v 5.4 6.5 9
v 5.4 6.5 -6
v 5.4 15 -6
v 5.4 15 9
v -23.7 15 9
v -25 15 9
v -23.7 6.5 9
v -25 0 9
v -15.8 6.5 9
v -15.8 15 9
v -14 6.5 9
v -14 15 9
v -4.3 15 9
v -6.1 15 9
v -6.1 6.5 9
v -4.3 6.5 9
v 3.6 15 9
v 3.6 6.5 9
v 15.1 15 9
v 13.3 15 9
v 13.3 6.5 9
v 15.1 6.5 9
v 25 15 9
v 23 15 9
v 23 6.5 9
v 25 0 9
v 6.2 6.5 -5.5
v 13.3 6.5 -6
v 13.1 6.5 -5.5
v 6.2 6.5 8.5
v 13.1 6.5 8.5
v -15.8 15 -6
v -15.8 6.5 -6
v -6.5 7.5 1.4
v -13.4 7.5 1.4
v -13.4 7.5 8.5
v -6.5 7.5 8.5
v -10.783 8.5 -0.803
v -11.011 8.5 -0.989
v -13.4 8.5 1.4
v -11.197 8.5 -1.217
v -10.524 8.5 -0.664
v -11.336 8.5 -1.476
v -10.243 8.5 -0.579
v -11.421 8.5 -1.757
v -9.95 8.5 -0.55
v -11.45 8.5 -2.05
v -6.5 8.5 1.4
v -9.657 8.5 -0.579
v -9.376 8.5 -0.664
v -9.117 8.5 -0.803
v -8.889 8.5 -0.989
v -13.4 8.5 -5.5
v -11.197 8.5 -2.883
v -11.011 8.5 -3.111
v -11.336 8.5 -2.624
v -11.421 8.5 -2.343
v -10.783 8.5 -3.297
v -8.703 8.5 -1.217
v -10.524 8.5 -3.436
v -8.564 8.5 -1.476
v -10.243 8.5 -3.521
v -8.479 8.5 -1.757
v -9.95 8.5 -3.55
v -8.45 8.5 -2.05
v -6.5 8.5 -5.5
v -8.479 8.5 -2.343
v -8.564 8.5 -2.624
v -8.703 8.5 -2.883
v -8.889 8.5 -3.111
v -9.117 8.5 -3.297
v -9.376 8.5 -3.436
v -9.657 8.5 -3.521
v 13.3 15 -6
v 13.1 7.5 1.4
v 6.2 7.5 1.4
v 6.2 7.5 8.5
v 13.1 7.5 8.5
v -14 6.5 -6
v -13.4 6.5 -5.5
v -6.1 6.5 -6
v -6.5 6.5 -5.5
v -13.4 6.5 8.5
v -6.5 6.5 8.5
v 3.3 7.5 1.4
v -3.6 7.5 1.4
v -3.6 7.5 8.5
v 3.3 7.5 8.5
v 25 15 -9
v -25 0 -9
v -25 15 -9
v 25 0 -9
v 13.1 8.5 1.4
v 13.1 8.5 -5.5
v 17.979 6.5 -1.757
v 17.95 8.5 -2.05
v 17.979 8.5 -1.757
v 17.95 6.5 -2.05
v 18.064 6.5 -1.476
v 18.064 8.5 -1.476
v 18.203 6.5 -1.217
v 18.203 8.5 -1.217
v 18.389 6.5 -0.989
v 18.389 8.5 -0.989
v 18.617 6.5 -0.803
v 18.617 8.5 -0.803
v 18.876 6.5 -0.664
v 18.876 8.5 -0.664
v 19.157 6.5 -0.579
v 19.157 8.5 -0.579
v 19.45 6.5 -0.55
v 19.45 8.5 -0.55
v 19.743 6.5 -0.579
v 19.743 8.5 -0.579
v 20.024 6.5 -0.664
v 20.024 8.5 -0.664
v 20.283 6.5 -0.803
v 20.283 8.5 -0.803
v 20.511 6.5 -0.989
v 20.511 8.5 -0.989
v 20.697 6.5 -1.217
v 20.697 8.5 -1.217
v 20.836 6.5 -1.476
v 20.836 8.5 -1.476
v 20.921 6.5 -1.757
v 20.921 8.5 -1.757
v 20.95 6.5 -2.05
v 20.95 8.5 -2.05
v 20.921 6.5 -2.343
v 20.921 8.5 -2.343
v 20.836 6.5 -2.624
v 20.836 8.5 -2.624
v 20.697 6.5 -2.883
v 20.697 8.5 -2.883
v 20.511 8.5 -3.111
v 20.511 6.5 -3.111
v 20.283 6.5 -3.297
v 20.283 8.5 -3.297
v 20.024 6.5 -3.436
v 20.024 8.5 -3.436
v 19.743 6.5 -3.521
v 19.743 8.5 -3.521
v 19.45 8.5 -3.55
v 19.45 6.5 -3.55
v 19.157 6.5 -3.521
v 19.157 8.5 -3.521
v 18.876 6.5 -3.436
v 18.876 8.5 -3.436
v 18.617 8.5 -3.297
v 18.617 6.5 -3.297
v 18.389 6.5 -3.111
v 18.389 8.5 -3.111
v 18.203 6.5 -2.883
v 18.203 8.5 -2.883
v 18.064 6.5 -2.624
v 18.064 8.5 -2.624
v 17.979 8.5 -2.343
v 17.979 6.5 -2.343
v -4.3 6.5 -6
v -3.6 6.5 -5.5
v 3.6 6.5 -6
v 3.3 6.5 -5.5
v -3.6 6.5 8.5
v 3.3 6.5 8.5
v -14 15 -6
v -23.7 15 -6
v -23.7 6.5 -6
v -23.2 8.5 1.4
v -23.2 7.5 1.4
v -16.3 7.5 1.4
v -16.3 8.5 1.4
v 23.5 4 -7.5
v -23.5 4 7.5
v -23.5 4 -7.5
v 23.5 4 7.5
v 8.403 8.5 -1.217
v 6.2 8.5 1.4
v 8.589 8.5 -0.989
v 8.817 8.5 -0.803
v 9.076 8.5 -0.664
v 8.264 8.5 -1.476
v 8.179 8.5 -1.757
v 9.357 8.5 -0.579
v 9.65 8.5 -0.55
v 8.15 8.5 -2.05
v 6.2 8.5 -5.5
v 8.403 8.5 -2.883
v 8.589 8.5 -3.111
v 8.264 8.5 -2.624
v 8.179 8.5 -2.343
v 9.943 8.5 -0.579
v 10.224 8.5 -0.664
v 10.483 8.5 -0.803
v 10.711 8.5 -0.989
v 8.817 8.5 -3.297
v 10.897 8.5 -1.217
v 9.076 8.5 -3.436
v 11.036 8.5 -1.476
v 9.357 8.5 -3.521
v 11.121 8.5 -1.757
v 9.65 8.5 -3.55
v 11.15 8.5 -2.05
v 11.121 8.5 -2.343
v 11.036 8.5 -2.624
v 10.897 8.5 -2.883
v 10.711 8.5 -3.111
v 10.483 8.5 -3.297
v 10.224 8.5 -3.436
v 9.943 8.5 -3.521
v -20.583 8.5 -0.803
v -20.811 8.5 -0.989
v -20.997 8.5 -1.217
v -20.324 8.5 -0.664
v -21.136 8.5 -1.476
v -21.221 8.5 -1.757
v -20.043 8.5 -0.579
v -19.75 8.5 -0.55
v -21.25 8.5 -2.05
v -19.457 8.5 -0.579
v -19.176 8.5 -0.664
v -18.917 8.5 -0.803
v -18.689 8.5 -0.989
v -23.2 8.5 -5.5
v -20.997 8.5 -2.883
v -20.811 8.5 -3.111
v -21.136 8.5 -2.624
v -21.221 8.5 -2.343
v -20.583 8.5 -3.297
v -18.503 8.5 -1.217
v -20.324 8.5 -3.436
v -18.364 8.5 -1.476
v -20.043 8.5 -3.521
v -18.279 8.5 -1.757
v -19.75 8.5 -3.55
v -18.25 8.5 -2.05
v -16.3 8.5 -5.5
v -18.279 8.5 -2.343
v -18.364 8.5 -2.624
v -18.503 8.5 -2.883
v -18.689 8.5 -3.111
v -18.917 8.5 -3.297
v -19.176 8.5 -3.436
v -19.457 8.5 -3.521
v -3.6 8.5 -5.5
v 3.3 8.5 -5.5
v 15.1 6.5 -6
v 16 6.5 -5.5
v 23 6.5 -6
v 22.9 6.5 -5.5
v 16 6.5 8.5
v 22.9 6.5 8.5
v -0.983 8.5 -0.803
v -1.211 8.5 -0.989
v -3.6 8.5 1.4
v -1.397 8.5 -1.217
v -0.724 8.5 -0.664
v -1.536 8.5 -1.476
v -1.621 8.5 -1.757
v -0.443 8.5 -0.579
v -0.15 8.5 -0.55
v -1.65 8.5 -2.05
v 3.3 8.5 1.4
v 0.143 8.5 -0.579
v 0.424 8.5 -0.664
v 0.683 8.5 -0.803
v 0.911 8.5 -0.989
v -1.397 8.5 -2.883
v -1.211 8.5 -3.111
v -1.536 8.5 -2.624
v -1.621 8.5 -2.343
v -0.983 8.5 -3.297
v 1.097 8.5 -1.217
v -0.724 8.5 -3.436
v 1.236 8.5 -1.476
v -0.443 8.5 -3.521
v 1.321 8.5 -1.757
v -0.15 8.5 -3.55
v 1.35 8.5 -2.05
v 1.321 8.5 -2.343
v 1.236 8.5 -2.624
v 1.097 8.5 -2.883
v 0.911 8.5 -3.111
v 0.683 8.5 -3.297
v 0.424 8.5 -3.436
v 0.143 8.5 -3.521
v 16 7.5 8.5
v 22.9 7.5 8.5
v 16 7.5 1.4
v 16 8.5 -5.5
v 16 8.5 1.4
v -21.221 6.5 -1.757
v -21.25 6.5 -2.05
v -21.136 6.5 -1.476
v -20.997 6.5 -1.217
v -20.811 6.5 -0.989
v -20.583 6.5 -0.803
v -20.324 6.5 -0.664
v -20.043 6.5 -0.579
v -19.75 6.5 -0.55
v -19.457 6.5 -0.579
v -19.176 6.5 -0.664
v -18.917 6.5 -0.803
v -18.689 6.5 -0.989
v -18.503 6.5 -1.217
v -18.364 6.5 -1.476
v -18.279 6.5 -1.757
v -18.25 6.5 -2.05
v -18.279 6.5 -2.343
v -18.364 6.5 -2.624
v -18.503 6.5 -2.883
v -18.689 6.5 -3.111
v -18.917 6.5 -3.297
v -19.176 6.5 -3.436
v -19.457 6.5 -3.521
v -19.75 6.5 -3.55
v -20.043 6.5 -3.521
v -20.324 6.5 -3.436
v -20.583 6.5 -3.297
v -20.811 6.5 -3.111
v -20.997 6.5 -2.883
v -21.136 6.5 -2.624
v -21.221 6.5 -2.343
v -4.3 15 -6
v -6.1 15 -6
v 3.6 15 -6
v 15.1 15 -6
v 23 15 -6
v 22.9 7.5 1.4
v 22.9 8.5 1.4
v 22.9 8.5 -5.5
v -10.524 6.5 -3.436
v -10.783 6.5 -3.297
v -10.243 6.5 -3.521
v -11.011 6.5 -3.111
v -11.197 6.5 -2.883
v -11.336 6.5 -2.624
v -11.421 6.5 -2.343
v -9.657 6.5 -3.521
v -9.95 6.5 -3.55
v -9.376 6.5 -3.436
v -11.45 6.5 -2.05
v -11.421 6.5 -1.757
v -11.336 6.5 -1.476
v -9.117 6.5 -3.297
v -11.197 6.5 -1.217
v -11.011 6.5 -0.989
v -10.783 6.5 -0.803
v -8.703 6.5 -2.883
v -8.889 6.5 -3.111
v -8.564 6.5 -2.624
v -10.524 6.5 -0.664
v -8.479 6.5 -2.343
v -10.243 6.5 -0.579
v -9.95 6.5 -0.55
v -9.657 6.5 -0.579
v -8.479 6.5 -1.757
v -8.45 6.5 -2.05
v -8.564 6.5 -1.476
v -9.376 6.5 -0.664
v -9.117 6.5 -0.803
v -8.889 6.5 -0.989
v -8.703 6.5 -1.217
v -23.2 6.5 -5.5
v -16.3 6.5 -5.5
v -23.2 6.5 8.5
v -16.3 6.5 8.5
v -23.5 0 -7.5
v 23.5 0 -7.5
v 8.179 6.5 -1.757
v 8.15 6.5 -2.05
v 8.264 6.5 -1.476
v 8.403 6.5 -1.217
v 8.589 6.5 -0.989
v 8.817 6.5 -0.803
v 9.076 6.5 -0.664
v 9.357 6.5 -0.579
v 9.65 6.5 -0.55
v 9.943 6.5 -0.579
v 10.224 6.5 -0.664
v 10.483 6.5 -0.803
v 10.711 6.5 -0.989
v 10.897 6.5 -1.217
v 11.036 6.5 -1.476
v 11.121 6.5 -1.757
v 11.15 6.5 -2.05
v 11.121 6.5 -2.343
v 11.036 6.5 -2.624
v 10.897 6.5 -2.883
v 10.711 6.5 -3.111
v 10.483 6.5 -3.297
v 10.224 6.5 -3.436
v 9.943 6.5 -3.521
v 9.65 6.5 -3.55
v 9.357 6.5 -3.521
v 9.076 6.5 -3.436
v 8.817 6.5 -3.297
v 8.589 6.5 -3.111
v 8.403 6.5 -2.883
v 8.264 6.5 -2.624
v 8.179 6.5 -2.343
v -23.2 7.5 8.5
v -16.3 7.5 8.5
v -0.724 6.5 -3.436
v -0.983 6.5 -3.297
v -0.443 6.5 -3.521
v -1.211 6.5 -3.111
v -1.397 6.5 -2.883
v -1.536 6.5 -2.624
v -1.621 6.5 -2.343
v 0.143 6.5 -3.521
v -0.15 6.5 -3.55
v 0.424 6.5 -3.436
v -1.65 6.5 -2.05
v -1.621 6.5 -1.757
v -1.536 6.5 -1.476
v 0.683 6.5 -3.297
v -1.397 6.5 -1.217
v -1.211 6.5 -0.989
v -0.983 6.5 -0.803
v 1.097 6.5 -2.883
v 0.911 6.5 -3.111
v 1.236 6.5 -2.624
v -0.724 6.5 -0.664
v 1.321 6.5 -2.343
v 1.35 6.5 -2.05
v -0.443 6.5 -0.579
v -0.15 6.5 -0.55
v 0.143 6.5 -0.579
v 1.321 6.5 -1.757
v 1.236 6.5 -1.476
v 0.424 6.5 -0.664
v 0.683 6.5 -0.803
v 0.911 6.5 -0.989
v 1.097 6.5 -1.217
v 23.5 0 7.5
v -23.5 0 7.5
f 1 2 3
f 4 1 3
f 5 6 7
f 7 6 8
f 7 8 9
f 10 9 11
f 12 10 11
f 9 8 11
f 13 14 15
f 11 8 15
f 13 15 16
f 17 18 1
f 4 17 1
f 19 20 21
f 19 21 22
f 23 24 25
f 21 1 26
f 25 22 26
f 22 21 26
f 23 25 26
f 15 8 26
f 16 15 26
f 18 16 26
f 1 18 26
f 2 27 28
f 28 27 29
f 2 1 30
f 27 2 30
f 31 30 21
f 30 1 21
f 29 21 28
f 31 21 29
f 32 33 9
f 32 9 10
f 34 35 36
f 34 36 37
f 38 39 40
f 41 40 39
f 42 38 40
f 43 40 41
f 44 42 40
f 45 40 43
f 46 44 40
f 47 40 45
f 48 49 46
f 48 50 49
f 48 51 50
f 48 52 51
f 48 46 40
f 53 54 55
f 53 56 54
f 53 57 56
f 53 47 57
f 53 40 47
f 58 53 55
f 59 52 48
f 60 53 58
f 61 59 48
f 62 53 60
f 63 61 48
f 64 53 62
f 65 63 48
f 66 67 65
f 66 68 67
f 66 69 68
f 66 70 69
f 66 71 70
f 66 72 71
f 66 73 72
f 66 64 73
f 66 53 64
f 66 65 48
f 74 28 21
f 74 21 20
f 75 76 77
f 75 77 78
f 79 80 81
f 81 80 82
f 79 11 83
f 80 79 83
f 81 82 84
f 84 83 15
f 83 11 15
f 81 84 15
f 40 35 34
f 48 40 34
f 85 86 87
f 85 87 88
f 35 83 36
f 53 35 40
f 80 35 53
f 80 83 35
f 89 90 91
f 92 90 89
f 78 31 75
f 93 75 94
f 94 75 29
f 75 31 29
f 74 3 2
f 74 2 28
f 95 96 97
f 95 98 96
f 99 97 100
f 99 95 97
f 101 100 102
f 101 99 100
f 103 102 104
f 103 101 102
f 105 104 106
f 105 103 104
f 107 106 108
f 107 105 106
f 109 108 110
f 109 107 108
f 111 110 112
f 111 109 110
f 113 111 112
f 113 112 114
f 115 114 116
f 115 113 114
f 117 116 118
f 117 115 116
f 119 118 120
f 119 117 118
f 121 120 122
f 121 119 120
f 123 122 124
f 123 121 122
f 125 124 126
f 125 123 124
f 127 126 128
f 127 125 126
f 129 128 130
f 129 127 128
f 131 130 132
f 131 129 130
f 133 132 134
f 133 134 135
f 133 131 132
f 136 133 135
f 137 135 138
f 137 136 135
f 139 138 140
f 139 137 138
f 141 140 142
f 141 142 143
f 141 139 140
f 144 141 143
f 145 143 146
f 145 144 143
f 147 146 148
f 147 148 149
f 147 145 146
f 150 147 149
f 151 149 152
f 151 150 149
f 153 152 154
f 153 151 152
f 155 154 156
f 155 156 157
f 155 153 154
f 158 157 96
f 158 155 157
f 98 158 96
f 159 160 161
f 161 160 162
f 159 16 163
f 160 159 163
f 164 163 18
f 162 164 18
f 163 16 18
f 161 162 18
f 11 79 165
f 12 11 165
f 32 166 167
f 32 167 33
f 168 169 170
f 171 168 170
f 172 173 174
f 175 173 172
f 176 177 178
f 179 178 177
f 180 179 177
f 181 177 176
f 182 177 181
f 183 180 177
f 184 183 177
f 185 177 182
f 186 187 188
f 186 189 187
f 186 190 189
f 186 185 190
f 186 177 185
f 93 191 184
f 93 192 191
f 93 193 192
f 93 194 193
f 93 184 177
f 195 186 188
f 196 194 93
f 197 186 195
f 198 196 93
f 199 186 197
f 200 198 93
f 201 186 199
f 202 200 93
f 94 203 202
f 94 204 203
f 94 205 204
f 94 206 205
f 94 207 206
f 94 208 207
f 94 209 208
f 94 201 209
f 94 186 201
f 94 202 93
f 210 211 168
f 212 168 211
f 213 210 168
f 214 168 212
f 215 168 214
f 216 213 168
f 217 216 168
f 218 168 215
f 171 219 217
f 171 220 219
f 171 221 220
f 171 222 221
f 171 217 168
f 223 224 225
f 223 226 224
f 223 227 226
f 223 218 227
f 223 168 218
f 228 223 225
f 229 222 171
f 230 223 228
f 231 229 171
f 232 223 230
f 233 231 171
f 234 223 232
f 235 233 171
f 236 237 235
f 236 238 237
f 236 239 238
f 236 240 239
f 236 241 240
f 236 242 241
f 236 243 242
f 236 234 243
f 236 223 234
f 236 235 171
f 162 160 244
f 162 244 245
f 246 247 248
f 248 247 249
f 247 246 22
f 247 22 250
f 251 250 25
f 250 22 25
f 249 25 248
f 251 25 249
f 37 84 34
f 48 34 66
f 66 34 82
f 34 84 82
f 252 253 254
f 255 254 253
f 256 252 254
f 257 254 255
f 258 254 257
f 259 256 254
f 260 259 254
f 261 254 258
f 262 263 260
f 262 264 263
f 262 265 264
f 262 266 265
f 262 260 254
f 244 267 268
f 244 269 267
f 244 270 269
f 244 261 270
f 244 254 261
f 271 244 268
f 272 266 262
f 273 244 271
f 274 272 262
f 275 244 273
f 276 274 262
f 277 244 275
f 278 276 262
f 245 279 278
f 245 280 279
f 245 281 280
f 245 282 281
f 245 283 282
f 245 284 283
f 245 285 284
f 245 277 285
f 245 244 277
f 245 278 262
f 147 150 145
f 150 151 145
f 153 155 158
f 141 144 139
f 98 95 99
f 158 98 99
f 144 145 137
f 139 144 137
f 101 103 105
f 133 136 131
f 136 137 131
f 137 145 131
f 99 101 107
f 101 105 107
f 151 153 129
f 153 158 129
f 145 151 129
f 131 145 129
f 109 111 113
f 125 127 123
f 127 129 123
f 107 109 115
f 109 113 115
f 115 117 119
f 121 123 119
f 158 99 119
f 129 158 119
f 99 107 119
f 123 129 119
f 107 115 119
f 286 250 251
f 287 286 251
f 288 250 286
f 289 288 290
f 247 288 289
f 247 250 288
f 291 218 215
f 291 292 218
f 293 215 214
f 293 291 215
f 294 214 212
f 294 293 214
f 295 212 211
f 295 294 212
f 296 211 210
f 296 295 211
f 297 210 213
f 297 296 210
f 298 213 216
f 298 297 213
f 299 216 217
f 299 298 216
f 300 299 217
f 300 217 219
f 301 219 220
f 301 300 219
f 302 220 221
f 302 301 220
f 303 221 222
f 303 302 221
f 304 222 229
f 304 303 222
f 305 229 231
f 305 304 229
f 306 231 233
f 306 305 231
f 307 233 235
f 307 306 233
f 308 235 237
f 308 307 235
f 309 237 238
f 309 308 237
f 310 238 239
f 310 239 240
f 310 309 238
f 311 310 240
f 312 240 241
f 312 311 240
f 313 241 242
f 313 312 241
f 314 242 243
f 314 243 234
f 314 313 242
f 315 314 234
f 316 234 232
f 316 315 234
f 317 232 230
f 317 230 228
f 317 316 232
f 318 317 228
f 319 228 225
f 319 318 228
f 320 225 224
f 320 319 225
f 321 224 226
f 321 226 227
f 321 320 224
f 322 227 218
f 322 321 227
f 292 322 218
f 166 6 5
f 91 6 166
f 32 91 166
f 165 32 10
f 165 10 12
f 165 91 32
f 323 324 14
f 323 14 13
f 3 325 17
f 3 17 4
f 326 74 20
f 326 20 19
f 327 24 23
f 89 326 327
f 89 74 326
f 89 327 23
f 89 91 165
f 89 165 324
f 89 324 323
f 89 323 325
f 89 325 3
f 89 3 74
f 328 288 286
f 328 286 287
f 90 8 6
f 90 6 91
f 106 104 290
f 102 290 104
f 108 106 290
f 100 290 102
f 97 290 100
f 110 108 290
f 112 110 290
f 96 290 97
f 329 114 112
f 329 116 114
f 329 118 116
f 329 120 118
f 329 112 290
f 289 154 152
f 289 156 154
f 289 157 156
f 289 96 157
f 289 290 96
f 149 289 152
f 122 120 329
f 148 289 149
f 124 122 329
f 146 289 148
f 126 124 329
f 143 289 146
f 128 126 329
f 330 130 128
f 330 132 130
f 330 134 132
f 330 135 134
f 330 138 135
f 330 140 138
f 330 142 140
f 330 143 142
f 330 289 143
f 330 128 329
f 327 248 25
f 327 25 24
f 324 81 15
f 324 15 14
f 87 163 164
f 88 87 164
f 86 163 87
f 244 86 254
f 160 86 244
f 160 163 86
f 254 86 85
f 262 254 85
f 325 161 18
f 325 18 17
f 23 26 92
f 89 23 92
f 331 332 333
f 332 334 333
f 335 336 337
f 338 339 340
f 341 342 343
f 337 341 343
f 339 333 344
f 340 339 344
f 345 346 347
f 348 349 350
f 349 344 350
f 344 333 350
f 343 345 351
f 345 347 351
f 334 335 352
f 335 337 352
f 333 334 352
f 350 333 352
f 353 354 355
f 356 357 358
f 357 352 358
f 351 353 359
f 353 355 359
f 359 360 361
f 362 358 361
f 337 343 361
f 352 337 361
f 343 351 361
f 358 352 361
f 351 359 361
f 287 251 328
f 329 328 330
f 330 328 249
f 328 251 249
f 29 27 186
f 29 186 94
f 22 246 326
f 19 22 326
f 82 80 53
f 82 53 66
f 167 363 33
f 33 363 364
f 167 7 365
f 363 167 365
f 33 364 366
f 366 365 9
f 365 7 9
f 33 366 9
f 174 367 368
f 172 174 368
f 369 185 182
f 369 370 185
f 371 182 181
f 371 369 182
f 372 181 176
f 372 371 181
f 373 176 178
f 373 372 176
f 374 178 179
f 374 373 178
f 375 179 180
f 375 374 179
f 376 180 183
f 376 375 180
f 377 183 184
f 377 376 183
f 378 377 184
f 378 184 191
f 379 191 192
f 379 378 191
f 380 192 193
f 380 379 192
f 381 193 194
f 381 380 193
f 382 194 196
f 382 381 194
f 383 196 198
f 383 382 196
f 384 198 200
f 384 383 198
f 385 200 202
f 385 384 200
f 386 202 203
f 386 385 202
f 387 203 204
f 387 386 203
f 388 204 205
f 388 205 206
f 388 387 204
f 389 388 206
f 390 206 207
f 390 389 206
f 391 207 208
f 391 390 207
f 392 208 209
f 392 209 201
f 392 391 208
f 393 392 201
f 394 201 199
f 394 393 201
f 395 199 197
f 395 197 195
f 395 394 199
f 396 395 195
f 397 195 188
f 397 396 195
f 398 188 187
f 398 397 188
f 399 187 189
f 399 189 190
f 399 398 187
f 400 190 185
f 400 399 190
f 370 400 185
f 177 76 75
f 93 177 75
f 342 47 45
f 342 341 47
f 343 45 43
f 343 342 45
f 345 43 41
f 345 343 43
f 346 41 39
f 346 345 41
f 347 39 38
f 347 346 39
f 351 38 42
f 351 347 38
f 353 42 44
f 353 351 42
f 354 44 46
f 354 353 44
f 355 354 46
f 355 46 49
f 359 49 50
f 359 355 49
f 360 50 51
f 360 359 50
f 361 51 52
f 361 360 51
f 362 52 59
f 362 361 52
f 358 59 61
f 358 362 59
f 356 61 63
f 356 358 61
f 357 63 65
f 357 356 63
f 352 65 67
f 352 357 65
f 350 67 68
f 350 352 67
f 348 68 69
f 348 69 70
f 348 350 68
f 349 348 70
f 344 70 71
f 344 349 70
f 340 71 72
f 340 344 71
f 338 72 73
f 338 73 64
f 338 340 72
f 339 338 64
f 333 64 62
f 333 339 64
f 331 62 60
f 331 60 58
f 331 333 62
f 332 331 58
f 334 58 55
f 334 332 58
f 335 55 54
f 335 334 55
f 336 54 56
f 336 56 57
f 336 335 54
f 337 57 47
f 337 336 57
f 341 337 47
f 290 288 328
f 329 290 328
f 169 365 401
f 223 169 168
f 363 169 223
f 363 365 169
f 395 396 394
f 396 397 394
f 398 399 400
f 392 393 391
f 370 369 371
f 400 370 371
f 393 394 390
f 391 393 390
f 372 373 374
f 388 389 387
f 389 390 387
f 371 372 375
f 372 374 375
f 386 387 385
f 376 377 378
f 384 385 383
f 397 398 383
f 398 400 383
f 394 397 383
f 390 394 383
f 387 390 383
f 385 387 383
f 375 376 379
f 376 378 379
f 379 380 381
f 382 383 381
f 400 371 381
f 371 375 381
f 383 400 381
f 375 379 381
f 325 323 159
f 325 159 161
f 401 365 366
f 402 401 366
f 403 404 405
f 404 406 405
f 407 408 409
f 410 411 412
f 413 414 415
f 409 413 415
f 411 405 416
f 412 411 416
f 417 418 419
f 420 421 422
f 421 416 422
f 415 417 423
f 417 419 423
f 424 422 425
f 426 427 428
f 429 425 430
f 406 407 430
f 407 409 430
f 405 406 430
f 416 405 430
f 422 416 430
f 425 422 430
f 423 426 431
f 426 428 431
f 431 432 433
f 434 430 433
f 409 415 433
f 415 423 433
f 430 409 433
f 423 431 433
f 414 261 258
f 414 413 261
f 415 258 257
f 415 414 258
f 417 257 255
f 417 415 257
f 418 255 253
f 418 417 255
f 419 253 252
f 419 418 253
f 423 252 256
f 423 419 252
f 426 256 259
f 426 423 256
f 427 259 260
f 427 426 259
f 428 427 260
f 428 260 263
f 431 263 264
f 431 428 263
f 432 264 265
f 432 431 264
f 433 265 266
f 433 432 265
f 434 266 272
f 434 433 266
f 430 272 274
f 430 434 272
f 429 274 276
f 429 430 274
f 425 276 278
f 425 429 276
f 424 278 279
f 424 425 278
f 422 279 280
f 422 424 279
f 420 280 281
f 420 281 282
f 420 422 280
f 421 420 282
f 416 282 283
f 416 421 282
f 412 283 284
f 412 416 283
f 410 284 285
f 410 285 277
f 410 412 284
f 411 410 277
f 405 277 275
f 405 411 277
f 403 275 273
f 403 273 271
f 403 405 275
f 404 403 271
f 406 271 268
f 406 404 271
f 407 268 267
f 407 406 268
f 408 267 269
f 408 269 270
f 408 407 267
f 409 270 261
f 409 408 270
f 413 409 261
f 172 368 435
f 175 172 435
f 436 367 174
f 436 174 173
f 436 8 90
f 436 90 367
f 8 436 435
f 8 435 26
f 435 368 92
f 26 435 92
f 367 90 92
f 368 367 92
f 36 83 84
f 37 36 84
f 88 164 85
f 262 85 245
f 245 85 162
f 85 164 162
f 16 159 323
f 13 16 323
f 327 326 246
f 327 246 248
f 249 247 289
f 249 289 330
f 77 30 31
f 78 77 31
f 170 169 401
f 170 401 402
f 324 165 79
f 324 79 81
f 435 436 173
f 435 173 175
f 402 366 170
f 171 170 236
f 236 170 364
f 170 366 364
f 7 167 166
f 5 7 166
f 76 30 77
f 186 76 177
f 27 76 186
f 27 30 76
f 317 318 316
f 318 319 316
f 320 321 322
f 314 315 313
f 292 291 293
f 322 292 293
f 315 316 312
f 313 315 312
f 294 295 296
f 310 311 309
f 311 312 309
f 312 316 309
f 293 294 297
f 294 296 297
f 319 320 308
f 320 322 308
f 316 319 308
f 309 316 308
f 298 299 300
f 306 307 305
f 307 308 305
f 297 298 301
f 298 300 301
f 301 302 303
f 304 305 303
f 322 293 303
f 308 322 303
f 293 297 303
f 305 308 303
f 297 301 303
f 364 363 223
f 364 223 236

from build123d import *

# Parameters (mm, degrees)
SKETCH1_W           = 50
SKETCH1_H           = 18
BOSS_EXTRUDE1_DEPTH = 15
SKETCH2_W           = 7.9
SKETCH2_H           = 8.5
CUT_EXTRUDE1_DEPTH  = 15
SKETCH3_W           = 47
SKETCH3_H           = 15
CUT_EXTRUDE2_DEPTH  = 4
SKETCH4_W           = 6.9
SKETCH4_H           = 14
SKETCH4_R           = 1.5
BOSS_EXTRUDE2_DEPTH = 1
LPATTERN1_COUNT     = 5
LPATTERN1_PITCH     = 9.8
SKETCH5_W           = 6.9
SKETCH5_H           = 6.9
SKETCH5_R           = 1.5
BOSS_EXTRUDE3_DEPTH = 1
LPATTERN2_COUNT     = 5
LPATTERN2_PITCH     = 9.8


with BuildPart() as part:
    # Sketch1 → Boss-Extrude1 (new body)
    with BuildSketch(Plane(origin=(0, 0, 0), x_dir=(1, 0, 0), z_dir=(0, 1, 0))):
        Rectangle(SKETCH1_W, SKETCH1_H)
    extrude(amount=BOSS_EXTRUDE1_DEPTH)

    # Sketch2 → Cut-Extrude1 (cut)
    with BuildSketch(Plane.XY.offset(9)):
        with Locations((-19.75, 10.75)):
            Rectangle(SKETCH2_W, SKETCH2_H)
        with Locations((-10.05, 10.75)):
            Rectangle(SKETCH2_W, SKETCH2_H)
        with Locations((-0.35, 10.75)):
            Rectangle(SKETCH2_W, SKETCH2_H)
        with Locations((9.35, 10.75)):
            Rectangle(SKETCH2_W, SKETCH2_H)
        with Locations((19.05, 10.75)):
            Rectangle(SKETCH2_W, SKETCH2_H)
    extrude(amount=-CUT_EXTRUDE1_DEPTH, mode=Mode.SUBTRACT)

    # Sketch3 → Cut-Extrude2 (cut)
    with BuildSketch(Plane.XZ):
        Rectangle(SKETCH3_W, SKETCH3_H)
    extrude(amount=-CUT_EXTRUDE2_DEPTH, mode=Mode.SUBTRACT)

    # Sketch4 → Boss-Extrude2 (add)
    with BuildSketch(Plane(origin=(0, 6.5, 0), x_dir=(1, 0, 0), z_dir=(0, 1, 0))):
        with Locations((-19.75, -1.5)):
            Rectangle(SKETCH4_W, SKETCH4_H)
        with Locations(Location((-19.75, 2.05, 0), (0, 0, 180))):
            Circle(SKETCH4_R, mode=Mode.SUBTRACT)
    boss_extrude2 = extrude(amount=BOSS_EXTRUDE2_DEPTH)

    # LPattern1: Boss-Extrude2 ×5
    with Locations(*[(i * LPATTERN1_PITCH, 0, 0) for i in range(1, LPATTERN1_COUNT)]):
        add(boss_extrude2)

    # Sketch5 → Boss-Extrude3 (add)
    with BuildSketch(Plane(origin=(0, 7.5, 0), x_dir=(1, 0, 0), z_dir=(0, 1, 0))):
        with Locations((-19.75, 2.05)):
            Rectangle(SKETCH5_W, SKETCH5_H)
        with Locations(Location((-19.75, 2.05, 0), (0, 0, 180))):
            Circle(SKETCH5_R, mode=Mode.SUBTRACT)
    boss_extrude3 = extrude(amount=BOSS_EXTRUDE3_DEPTH)

    # LPattern2: Boss-Extrude3 ×5
    with Locations(*[(i * LPATTERN2_PITCH, 0, 0) for i in range(1, LPATTERN2_COUNT)]):
        add(boss_extrude3)


solid = part.part
